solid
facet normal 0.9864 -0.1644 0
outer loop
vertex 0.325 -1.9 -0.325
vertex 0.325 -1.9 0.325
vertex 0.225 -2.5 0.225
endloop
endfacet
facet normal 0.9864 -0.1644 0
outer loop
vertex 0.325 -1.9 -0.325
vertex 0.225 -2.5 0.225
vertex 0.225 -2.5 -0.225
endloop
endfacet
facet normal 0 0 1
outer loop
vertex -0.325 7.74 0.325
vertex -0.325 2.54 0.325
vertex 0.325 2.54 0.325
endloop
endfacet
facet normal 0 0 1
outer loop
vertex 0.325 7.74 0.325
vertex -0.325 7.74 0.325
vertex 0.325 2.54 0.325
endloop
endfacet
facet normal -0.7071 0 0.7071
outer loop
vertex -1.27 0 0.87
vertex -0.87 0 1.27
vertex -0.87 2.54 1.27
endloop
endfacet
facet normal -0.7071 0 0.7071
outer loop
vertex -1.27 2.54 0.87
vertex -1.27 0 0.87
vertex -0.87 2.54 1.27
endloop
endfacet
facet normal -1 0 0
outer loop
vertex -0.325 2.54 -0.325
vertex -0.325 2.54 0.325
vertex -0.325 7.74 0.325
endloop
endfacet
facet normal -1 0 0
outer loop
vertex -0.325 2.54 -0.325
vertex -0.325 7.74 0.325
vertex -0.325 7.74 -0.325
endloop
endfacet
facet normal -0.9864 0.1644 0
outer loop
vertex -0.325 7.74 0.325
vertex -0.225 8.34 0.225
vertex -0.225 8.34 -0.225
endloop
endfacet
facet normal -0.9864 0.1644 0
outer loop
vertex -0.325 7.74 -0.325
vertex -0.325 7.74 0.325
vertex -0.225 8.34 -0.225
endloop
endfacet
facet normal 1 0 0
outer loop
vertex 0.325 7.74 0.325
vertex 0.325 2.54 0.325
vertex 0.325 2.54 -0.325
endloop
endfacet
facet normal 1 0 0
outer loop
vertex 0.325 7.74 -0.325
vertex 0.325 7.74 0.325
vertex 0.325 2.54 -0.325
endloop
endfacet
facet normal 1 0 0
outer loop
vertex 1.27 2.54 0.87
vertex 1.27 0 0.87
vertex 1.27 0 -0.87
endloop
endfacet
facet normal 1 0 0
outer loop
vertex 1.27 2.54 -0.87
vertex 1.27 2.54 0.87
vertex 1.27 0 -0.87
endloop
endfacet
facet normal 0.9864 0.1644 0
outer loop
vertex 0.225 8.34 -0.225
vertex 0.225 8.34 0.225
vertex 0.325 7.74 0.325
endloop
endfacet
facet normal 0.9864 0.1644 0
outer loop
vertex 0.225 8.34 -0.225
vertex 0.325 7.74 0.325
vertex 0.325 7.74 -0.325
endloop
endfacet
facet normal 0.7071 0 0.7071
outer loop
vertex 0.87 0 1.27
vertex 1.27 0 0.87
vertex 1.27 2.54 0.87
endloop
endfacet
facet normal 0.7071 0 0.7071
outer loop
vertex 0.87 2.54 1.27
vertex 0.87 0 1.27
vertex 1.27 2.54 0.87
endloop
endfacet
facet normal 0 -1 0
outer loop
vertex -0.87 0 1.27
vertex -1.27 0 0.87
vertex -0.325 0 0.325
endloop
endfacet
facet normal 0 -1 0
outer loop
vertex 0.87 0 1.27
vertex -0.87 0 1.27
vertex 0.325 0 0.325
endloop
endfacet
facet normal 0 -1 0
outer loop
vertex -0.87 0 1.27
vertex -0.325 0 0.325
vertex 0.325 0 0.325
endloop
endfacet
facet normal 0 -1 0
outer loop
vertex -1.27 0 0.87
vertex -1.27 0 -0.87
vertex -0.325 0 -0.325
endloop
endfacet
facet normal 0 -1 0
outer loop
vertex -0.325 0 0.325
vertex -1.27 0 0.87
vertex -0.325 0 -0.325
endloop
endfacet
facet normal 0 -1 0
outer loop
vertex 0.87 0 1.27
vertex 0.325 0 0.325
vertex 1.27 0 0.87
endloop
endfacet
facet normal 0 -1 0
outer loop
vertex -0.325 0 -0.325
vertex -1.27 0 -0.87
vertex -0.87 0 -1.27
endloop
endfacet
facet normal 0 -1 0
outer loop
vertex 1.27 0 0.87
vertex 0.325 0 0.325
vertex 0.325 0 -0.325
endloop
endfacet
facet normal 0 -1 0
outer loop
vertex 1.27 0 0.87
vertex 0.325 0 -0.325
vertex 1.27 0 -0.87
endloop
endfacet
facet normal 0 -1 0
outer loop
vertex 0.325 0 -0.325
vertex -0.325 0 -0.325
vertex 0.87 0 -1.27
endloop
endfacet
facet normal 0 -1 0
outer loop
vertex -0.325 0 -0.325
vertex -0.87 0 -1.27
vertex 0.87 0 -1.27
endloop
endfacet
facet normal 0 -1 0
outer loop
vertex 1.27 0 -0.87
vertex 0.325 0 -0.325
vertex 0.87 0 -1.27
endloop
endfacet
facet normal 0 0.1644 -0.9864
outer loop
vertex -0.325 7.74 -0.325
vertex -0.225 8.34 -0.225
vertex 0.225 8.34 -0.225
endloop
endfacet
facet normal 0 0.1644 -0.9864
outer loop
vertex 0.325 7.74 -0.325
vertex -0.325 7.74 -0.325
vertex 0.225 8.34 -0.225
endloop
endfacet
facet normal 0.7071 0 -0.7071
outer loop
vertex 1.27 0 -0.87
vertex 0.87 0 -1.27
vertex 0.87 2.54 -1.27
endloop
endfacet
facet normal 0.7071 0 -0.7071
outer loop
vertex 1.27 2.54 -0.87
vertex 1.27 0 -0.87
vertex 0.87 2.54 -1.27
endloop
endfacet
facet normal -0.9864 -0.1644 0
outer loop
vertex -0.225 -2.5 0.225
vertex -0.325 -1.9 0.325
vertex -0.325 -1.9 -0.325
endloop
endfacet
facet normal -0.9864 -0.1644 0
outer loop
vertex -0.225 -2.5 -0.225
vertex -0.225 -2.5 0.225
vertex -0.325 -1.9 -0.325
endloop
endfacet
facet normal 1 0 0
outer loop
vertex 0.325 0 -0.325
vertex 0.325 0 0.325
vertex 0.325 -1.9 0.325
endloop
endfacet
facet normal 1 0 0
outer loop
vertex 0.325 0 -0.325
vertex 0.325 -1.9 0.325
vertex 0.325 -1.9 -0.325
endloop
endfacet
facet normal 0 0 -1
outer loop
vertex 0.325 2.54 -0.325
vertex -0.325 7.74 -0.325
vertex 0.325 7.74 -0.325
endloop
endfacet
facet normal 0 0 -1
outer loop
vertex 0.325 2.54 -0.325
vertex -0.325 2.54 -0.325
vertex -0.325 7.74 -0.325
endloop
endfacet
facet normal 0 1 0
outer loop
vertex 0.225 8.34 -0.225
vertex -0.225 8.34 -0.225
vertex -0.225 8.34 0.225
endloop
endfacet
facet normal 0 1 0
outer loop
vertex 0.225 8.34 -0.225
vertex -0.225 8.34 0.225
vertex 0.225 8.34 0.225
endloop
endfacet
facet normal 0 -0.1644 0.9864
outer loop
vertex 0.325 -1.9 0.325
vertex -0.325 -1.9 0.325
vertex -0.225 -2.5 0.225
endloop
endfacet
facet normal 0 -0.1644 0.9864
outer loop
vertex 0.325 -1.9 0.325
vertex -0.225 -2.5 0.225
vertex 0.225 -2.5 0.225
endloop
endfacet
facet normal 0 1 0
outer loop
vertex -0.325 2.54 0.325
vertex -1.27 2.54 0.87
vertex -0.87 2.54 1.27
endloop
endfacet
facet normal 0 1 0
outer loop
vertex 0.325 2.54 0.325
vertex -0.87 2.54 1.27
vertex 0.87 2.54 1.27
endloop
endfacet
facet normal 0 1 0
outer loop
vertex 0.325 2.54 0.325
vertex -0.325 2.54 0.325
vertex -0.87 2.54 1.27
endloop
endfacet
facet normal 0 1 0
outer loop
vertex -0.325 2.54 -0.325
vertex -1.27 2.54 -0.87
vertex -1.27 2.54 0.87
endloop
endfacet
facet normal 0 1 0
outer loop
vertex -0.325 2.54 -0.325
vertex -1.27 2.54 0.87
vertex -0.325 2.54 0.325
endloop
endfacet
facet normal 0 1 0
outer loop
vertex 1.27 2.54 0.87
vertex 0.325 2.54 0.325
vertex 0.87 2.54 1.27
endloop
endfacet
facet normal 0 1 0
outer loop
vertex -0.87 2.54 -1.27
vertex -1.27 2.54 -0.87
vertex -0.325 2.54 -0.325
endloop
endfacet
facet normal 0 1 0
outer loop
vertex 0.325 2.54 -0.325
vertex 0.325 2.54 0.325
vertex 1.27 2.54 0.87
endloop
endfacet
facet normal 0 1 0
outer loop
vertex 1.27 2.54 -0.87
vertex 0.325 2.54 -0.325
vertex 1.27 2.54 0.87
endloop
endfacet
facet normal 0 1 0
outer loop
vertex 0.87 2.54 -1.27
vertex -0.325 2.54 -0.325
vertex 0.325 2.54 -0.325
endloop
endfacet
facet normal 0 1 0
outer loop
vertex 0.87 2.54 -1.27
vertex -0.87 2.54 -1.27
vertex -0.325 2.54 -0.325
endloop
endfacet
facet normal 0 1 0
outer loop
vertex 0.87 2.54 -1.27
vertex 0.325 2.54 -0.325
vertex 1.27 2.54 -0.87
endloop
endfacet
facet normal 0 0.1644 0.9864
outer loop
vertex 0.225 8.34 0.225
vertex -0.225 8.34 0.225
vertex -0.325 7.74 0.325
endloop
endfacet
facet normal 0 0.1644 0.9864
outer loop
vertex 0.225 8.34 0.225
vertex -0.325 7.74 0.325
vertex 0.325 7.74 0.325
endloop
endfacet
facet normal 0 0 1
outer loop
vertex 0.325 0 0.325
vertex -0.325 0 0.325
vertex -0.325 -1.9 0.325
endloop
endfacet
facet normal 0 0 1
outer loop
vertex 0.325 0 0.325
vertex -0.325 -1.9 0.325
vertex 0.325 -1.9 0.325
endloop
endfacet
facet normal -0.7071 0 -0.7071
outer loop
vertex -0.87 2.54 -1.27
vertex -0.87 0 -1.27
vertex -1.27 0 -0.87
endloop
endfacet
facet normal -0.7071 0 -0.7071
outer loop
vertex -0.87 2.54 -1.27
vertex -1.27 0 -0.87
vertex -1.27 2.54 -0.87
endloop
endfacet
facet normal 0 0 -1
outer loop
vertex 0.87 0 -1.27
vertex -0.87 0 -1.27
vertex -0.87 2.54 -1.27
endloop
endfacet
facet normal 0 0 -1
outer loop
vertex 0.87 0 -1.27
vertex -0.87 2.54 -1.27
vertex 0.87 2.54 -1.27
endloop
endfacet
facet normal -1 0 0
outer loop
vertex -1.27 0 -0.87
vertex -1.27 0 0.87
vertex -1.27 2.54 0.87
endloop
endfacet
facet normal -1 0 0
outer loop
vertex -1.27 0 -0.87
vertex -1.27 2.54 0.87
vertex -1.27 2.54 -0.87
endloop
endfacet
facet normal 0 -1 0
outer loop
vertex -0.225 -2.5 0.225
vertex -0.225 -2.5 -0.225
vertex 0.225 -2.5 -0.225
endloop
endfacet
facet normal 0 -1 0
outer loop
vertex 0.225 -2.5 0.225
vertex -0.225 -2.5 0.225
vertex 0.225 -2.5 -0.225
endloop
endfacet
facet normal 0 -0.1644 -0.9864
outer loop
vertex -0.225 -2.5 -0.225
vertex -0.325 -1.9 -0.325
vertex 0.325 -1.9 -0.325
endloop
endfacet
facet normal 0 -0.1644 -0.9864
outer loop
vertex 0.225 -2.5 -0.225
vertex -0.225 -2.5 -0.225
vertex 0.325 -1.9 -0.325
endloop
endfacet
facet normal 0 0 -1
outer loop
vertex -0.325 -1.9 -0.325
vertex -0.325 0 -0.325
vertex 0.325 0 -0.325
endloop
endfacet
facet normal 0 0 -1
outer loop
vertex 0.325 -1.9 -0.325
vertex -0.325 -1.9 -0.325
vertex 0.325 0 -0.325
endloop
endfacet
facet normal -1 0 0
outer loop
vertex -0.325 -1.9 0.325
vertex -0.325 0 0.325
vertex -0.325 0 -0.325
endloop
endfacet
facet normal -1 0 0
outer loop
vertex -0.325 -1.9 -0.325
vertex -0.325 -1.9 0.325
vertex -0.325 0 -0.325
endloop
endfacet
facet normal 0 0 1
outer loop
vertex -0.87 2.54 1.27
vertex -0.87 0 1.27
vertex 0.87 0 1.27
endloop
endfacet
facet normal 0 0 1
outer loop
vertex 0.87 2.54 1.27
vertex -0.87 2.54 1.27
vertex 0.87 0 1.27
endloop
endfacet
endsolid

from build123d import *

# Parameters (mm, degrees)
SKETCH_1_W             = 2.54
SKETCH_1_H             = 2.54
EXTRUDE_1_DEPTH        = 2.54
CHAMFER_1_SIZE         = 0.4
SKETCH_2_W             = 0.65
SKETCH_2_H             = 0.65
EXTRUDE_2_DEPTH        = 5.8
EXTRUDE_START          = -2.54
SKETCH_2_2_W           = 0.65
SKETCH_2_2_H           = 0.65
EXTRUDE_3_DEPTH        = 2.5
CHAMFER_2_SIZE         = 0.6
CHAMFER_2_SIZE2        = 0.1
CHAMFER_2_PART_2_SIZE  = 0.6
CHAMFER_2_PART_2_SIZE2 = 0.1
CHAMFER_2_PART_3_SIZE  = 0.6
CHAMFER_2_PART_3_SIZE2 = 0.1
CHAMFER_2_PART_4_SIZE  = 0.6
CHAMFER_2_PART_4_SIZE2 = 0.1
CHAMFER_3_SIZE         = 0.1
CHAMFER_3_SIZE2        = 0.6


with BuildPart() as part:
    # Эскиз1 → Бобышка-Вытянуть1 (new body)
    with BuildSketch(Plane(origin=(0, 0, 0), x_dir=(1, 0, 0), z_dir=(0, 1, 0))):
        Rectangle(SKETCH_1_W, SKETCH_1_H)
    extrude(amount=EXTRUDE_1_DEPTH)

    # Фаска1
    chamfer_1_edges = [part.edges().sort_by_distance(p)[0] for p in [
        (-1.27, 1.27, -1.27),
        (1.27, 1.27, -1.27),
        (1.27, 1.27, 1.27),
        (-1.27, 1.27, 1.27),
    ]]
    chamfer(chamfer_1_edges, length=CHAMFER_1_SIZE)

    # Эскиз2 → Бобышка-Вытянуть2 (add)
    with BuildSketch(Plane(origin=(0, 2.54, 0), x_dir=(1, 0, 0), z_dir=(0, 1, 0))):
        Rectangle(SKETCH_2_W, SKETCH_2_H)
    extrude(amount=EXTRUDE_2_DEPTH)

    # Эскиз2<2> → Бобышка-Вытянуть3 (add)
    with BuildSketch(Plane(origin=(0, 2.54, 0), x_dir=(1, 0, 0), z_dir=(0, 1, 0)).offset(EXTRUDE_START)):
        Rectangle(SKETCH_2_2_W, SKETCH_2_2_H)
    extrude(amount=-EXTRUDE_3_DEPTH)

    # Фаска2
    chamfer_2_edges = [part.edges().sort_by_distance(p)[0] for p in [
        (-0.325, 8.34, 0),
    ]]
    chamfer_2_side = [part.faces().sort_by_distance(p)[0] for p in [
        (-0.325, 5.44, 0),
    ]]
    chamfer(chamfer_2_edges, length=CHAMFER_2_SIZE, length2=CHAMFER_2_SIZE2, reference=chamfer_2_side[0])

    # Фаска2 part 2
    chamfer_2_part_2_edges = [part.edges().sort_by_distance(p)[0] for p in [
        (0, 8.34, 0.325),
    ]]
    chamfer_2_part_2_side = [part.faces().sort_by_distance(p)[0] for p in [
        (0, 5.44, 0.325),
    ]]
    chamfer(chamfer_2_part_2_edges, length=CHAMFER_2_PART_2_SIZE, length2=CHAMFER_2_PART_2_SIZE2, reference=chamfer_2_part_2_side[0])

    # Фаска2 part 3
    chamfer_2_part_3_edges = [part.edges().sort_by_distance(p)[0] for p in [
        (0.325, 8.34, 0),
    ]]
    chamfer_2_part_3_side = [part.faces().sort_by_distance(p)[0] for p in [
        (0.325, 5.44, 0),
    ]]
    chamfer(chamfer_2_part_3_edges, length=CHAMFER_2_PART_3_SIZE, length2=CHAMFER_2_PART_3_SIZE2, reference=chamfer_2_part_3_side[0])

    # Фаска2 part 4
    chamfer_2_part_4_edges = [part.edges().sort_by_distance(p)[0] for p in [
        (0, 8.34, -0.325),
    ]]
    chamfer_2_part_4_side = [part.faces().sort_by_distance(p)[0] for p in [
        (0, 5.44, -0.325),
    ]]
    chamfer(chamfer_2_part_4_edges, length=CHAMFER_2_PART_4_SIZE, length2=CHAMFER_2_PART_4_SIZE2, reference=chamfer_2_part_4_side[0])

    # Фаска3
    chamfer_3_edges = [part.edges().sort_by_distance(p)[0] for p in [
        (-0.325, -2.5, 0),
        (0, -2.5, -0.325),
        (0.325, -2.5, 0),
        (0, -2.5, 0.325),
    ]]
    chamfer_3_side = [part.faces().sort_by_distance(p)[0] for p in [
        (0, -2.5, 0),
    ]]
    chamfer(chamfer_3_edges, length=CHAMFER_3_SIZE, length2=CHAMFER_3_SIZE2, reference=chamfer_3_side[0])


solid = part.part
